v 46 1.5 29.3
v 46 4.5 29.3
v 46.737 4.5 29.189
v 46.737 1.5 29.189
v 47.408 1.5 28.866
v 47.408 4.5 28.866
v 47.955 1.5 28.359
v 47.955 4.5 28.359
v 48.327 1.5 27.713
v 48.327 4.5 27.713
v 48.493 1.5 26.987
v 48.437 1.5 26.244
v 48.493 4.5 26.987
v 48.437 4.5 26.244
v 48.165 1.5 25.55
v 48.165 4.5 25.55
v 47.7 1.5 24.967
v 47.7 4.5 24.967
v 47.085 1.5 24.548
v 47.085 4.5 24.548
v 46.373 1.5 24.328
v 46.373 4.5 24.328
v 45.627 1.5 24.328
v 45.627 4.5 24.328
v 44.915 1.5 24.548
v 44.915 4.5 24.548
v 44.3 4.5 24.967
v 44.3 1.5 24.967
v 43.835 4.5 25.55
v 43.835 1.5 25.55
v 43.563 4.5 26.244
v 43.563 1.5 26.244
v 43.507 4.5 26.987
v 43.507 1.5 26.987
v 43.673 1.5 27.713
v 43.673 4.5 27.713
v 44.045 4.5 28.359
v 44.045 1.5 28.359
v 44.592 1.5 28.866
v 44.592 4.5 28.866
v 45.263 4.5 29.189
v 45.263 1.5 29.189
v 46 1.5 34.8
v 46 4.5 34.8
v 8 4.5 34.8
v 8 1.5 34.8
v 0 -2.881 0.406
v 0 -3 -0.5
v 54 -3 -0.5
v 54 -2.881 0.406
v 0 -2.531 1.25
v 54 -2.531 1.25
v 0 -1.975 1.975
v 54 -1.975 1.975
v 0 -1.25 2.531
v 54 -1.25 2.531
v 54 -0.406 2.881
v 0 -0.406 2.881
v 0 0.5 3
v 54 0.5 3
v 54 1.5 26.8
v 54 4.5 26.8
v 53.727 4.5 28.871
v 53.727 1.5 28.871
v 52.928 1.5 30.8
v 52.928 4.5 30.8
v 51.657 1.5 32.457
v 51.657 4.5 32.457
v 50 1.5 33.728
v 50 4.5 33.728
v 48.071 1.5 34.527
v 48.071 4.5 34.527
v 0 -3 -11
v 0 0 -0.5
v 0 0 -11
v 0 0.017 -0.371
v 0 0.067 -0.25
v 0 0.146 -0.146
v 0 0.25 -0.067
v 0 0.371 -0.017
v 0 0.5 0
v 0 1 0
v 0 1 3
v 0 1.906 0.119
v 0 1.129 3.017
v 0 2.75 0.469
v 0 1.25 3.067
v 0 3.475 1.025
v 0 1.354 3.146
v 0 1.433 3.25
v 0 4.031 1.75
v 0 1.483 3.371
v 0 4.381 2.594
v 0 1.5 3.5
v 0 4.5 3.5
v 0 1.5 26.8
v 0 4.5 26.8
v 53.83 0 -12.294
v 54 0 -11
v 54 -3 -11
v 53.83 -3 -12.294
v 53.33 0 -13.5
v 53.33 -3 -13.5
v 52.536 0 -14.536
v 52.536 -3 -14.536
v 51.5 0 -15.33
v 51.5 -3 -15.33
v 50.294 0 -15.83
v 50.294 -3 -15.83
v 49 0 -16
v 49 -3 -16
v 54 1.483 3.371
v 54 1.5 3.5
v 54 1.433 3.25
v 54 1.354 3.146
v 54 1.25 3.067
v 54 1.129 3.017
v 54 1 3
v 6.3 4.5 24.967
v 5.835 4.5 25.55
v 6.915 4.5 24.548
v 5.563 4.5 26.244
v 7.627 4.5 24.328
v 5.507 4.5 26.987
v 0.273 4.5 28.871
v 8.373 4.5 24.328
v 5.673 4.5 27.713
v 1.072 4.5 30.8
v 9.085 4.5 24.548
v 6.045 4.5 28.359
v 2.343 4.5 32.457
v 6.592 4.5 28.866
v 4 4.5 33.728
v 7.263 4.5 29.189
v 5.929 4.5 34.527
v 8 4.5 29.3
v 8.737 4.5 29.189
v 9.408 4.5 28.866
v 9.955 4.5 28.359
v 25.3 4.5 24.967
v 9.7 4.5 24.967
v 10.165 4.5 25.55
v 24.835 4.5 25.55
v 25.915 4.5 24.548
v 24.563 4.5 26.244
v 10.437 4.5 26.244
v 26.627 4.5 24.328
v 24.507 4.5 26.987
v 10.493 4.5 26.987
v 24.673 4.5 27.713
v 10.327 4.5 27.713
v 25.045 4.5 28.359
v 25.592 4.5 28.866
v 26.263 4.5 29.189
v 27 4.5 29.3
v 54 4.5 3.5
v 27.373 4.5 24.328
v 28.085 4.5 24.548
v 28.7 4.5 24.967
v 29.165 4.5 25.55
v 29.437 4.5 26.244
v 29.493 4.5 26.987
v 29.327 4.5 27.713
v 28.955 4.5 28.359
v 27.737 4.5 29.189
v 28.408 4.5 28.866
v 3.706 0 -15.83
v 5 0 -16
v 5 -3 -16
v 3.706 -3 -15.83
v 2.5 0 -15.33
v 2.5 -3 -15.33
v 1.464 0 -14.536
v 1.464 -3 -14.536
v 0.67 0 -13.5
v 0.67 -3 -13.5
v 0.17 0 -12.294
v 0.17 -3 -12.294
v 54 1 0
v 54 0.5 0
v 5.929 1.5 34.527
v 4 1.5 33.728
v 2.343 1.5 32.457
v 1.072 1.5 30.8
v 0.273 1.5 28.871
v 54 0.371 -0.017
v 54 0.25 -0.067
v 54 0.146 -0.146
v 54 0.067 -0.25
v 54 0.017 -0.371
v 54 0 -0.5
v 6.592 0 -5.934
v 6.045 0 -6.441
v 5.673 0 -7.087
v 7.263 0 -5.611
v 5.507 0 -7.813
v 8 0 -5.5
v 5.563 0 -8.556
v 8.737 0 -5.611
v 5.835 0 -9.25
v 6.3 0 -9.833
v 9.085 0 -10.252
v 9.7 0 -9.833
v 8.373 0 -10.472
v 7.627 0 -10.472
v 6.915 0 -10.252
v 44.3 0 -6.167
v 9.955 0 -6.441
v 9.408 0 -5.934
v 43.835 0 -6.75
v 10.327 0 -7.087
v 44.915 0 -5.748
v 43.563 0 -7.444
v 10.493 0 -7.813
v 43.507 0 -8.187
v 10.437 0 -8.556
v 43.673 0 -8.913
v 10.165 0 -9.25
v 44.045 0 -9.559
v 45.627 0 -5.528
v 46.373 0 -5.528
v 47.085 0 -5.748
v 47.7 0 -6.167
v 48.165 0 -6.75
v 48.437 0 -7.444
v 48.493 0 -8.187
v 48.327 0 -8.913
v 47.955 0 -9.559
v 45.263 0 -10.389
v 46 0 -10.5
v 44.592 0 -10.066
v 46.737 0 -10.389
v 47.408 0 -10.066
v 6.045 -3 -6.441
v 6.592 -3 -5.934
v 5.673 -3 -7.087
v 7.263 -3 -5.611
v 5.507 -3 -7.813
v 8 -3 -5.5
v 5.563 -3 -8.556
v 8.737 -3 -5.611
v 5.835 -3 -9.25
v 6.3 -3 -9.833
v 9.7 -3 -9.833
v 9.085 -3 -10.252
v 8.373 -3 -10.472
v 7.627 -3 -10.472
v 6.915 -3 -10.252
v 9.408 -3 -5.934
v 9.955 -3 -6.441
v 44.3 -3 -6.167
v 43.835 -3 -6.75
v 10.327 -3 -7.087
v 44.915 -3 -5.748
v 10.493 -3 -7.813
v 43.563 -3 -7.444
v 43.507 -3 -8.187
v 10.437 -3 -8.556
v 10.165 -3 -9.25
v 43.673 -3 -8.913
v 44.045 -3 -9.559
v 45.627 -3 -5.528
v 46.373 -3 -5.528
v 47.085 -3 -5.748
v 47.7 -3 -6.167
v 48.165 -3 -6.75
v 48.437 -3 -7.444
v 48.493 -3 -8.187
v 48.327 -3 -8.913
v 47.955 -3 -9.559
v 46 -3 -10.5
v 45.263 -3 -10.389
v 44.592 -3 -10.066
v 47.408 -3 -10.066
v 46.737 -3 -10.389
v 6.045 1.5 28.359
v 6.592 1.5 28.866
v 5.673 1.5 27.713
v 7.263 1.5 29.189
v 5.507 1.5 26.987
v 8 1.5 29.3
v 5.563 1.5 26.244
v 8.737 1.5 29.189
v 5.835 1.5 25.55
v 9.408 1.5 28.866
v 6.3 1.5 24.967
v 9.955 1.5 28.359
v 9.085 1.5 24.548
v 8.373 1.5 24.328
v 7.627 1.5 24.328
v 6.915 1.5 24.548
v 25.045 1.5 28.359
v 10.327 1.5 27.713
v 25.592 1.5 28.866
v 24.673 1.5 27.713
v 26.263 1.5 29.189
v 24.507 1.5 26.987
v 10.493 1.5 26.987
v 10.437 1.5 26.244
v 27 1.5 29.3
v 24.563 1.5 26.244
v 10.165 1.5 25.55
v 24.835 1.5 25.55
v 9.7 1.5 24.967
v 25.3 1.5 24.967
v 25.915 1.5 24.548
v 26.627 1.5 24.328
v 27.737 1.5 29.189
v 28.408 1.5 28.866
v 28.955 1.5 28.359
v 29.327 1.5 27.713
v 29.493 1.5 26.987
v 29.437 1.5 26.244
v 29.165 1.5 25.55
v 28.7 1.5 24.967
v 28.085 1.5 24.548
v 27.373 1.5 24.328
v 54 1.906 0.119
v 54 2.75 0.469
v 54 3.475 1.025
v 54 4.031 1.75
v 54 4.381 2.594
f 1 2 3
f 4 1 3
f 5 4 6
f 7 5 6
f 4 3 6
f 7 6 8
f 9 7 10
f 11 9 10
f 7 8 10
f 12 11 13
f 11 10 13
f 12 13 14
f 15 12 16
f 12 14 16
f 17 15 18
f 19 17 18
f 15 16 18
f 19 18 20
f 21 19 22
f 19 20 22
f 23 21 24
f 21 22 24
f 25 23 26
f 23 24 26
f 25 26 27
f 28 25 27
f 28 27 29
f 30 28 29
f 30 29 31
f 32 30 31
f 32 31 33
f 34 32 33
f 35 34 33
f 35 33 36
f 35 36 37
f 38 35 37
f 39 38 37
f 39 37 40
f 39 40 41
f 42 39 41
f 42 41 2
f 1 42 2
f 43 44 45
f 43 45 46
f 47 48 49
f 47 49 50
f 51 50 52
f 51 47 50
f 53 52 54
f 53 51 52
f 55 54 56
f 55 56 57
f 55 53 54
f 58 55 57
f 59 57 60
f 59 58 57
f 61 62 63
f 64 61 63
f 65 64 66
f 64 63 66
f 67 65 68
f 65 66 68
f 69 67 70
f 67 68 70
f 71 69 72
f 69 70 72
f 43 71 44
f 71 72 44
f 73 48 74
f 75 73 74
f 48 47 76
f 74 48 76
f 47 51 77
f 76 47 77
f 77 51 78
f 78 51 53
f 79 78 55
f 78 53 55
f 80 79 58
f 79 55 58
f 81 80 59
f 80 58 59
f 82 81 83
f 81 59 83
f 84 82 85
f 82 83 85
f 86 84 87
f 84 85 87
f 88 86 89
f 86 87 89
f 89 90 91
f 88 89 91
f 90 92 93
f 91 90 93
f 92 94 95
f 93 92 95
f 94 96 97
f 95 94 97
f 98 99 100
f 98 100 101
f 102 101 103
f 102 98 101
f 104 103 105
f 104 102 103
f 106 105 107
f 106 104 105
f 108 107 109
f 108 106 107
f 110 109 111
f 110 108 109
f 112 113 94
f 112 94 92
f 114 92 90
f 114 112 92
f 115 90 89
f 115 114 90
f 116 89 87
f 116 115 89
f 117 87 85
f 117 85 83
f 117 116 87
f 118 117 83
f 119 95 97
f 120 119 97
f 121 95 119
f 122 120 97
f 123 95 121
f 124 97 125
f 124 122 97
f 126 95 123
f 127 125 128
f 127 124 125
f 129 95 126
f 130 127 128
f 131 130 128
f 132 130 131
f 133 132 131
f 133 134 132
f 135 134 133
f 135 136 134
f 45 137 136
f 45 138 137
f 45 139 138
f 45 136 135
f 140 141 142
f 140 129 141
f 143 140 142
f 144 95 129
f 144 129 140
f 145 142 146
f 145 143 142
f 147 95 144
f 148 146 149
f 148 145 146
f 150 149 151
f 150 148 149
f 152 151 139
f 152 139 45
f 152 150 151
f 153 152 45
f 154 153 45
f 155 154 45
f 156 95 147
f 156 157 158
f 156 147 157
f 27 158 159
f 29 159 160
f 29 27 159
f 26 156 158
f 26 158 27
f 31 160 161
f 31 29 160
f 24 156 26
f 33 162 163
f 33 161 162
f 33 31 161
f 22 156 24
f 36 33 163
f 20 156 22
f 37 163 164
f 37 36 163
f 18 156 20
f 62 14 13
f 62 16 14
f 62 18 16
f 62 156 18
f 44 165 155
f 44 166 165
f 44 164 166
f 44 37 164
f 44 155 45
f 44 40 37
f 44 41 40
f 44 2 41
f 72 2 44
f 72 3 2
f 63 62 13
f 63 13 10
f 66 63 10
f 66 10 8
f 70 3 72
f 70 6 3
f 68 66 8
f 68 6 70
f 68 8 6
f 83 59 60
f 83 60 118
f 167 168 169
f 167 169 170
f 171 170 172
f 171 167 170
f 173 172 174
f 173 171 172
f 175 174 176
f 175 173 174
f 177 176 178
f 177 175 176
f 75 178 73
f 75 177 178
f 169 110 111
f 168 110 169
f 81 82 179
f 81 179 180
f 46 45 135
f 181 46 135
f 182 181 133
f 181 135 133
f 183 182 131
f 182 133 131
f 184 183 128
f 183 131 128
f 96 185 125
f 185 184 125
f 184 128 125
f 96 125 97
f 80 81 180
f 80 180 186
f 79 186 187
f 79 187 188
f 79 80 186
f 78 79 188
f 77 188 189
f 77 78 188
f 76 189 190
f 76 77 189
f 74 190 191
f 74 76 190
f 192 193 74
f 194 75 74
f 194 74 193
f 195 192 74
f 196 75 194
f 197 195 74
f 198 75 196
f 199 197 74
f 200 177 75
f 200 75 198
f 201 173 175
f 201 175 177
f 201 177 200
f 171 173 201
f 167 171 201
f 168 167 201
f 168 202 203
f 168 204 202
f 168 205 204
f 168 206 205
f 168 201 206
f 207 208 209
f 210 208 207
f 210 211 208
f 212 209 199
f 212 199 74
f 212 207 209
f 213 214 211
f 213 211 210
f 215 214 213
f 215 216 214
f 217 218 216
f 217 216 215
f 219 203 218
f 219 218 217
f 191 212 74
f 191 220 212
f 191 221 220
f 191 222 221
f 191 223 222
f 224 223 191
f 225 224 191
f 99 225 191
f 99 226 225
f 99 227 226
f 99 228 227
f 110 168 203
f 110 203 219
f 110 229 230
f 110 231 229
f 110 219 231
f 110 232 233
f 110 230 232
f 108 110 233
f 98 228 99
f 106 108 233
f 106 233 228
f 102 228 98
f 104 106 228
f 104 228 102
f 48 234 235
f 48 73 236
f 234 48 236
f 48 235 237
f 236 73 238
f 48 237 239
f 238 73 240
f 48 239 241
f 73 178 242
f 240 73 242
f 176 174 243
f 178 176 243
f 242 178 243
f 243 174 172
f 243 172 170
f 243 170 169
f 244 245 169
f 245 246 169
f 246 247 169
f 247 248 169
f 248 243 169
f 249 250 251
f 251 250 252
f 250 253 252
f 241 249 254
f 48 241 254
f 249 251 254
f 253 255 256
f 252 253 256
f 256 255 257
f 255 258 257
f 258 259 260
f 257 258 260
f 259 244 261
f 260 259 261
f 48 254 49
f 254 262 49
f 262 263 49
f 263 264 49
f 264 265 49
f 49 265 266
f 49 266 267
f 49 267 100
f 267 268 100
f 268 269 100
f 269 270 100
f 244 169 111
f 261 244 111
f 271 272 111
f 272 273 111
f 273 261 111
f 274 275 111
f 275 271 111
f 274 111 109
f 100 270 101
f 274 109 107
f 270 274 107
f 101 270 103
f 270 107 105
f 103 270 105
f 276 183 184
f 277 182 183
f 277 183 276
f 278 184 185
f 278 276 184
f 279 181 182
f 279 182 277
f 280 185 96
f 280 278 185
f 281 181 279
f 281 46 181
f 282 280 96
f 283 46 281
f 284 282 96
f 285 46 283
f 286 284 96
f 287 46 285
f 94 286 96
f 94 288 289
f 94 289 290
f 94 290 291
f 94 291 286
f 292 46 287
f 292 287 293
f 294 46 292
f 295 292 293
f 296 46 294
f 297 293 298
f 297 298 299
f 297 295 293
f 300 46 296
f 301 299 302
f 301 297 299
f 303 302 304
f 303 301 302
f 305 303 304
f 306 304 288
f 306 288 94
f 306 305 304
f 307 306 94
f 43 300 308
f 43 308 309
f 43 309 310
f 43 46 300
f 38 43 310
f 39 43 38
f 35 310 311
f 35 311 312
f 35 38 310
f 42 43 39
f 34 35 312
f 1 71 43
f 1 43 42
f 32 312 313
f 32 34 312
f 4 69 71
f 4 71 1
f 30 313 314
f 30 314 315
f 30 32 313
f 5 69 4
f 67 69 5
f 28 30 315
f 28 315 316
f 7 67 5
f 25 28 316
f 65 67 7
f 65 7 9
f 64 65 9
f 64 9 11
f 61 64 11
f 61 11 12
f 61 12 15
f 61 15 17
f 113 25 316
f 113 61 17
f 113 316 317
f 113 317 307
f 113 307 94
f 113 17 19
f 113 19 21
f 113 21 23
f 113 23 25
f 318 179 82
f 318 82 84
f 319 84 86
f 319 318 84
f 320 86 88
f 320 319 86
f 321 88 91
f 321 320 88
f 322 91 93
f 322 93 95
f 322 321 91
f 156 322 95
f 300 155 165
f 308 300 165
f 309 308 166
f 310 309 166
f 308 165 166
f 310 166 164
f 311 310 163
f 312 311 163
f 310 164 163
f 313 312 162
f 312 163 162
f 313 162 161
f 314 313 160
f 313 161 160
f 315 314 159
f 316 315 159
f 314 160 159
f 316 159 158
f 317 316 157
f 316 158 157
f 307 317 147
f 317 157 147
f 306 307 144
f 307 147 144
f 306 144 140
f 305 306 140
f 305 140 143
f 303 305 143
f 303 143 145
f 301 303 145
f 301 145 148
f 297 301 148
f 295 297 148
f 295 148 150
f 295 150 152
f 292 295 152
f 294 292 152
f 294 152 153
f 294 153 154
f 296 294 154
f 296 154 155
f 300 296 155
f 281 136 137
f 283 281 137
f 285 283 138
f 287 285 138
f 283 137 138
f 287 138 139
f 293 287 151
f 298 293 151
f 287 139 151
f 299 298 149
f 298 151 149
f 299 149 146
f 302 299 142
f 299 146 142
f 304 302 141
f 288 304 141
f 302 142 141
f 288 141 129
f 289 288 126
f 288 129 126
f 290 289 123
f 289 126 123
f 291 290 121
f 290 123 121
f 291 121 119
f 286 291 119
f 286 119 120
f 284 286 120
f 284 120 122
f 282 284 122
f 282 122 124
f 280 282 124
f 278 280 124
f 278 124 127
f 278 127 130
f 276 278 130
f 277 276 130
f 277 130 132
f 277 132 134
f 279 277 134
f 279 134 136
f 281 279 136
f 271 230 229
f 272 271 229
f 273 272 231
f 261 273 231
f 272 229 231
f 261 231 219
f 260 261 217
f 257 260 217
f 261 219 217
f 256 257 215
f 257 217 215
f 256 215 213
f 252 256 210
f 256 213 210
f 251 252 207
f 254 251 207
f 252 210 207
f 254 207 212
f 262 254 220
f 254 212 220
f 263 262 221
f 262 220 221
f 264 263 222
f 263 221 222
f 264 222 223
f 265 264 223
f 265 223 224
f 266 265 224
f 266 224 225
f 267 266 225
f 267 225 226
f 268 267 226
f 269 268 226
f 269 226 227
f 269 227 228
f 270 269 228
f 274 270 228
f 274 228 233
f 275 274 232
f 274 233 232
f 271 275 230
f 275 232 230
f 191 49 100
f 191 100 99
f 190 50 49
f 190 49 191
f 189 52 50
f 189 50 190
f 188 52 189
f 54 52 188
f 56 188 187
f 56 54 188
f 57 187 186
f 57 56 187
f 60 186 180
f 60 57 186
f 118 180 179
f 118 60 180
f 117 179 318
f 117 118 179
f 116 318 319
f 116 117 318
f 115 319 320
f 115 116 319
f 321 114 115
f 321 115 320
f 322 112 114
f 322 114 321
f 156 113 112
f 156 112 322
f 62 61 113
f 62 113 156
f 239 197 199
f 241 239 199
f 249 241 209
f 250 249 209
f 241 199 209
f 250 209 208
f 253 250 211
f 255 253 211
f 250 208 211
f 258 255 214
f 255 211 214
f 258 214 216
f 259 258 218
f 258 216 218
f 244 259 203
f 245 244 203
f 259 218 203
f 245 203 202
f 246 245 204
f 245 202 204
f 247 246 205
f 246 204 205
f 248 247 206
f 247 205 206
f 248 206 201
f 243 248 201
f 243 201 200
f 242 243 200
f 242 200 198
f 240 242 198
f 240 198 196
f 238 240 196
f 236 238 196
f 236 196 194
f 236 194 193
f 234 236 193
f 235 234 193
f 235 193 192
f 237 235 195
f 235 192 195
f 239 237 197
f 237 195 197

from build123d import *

# Parameters (mm, degrees)
SKETCH1_R                    = 2.5
BASE_FLANGE1_DEPTH           = 3
EDGE_FLANGE1_STRIP_W         = 13
EDGE_FLANGE1_STRIP_H         = 3
EDGE_FLANGE1_STRIP_CUT_DEPTH = 54
EDGE_FLANGE1_DEPTH           = 54
EDGE_FLANGE2_DEPTH           = 54
SKETCH25_R                   = 2.5
CUT_EXTRUDE1_DEPTH           = 65.67835805


# Sheet-metal steps are written as plain solids
with BuildPart() as part:
    # Sketch1 → Base-Flange1 (new body)
    with BuildSketch(Plane(origin=(0, 0, 0), x_dir=(1, 0, 0), z_dir=(0, 1, 0))):
        with BuildLine():
            Line((0, 0), (54, 0))
            Line((54, 0), (54, 11))
            ThreePointArc((54, 11), (52.535533906, 14.535533906), (49, 16))
            Line((49, 16), (5, 16))
            ThreePointArc((5, 16), (1.464466094, 14.535533906), (0, 11))
            Line((0, 11), (0, 0))
        make_face()
        with Locations(Location((8, 8, 0), (0, 0, 270))):
            Circle(SKETCH1_R, mode=Mode.SUBTRACT)
        with Locations(Location((46, 8, 0), (0, 0, 90))):
            Circle(SKETCH1_R, mode=Mode.SUBTRACT)
    extrude(amount=-BASE_FLANGE1_DEPTH)

    # Edge-Flange1 strip (across the edge) → Edge-Flange1 strip cut (cut)
    with BuildSketch(Plane(origin=(0, 0, 0), x_dir=(0, 0, -1), z_dir=(1, 0, 0))):
        with Locations((-6, -1.5)):
            Rectangle(EDGE_FLANGE1_STRIP_W, EDGE_FLANGE1_STRIP_H)
    extrude(amount=EDGE_FLANGE1_STRIP_CUT_DEPTH, mode=Mode.SUBTRACT)

    # Edge-Flange1 section (across the edge) → Edge-Flange1 (add)
    with BuildSketch(Plane(origin=(0, 0, 0), x_dir=(0, 0, -1), z_dir=(1, 0, 0))):
        with BuildLine():
            Line((-3, 0.5), (-3, 1))
            Line((-3, 1), (0, 1))
            Line((0, 1), (0, 0.5))
            ThreePointArc((0, 0.5), (0.146446609, 0.146446609), (0.5, 0))
            Line((0.5, 0), (0.5, -3))
            ThreePointArc((0.5, -3), (-1.974873734, -1.974873734), (-3, 0.5))
        make_face()
    extrude(amount=EDGE_FLANGE1_DEPTH)

    # Edge-Flange2 section (across the edge) → Edge-Flange2 (add)
    with BuildSketch(Plane(origin=(54, 1.5, 3), x_dir=(0, -1, 0), z_dir=(-1, 0, 0))):
        with BuildLine():
            Line((-3, 0.5), (-3, 31.8))
            Line((-3, 31.8), (0, 31.8))
            Line((0, 31.8), (0, 0.5))
            ThreePointArc((0, 0.5), (0.146446609, 0.146446609), (0.5, 0))
            Line((0.5, 0), (0.5, -3))
            ThreePointArc((0.5, -3), (-1.974873734, -1.974873734), (-3, 0.5))
        make_face()
    extrude(amount=EDGE_FLANGE2_DEPTH)

    # Sketch25 → Cut-Extrude1 (cut, through all)
    with BuildSketch(Plane(origin=(0, 4.5, 0), x_dir=(1, 0, 0), z_dir=(0, 1, 0))):
        with Locations(Location((27, -26.8, 0), (0, 0, 270))):
            Circle(SKETCH25_R)
        with Locations(Location((8, -26.8, 0), (0, 0, 270))):
            Circle(SKETCH25_R)
        with BuildLine():
            ThreePointArc((8, -34.8), (2.343145751, -32.456854249), (0, -26.8))
            Line((0, -26.8), (0, -34.8))
            Line((0, -34.8), (8, -34.8))
        make_face()
        with Locations(Location((46, -26.8, 0), (0, 0, 270))):
            Circle(SKETCH25_R)
        with BuildLine():
            Line((54, -34.8), (54, -26.8))
            ThreePointArc((54, -26.8), (51.656854249, -32.456854249), (46, -34.8))
            Line((46, -34.8), (54, -34.8))
        make_face()
    extrude(amount=-CUT_EXTRUDE1_DEPTH, mode=Mode.SUBTRACT)


solid = part.part
